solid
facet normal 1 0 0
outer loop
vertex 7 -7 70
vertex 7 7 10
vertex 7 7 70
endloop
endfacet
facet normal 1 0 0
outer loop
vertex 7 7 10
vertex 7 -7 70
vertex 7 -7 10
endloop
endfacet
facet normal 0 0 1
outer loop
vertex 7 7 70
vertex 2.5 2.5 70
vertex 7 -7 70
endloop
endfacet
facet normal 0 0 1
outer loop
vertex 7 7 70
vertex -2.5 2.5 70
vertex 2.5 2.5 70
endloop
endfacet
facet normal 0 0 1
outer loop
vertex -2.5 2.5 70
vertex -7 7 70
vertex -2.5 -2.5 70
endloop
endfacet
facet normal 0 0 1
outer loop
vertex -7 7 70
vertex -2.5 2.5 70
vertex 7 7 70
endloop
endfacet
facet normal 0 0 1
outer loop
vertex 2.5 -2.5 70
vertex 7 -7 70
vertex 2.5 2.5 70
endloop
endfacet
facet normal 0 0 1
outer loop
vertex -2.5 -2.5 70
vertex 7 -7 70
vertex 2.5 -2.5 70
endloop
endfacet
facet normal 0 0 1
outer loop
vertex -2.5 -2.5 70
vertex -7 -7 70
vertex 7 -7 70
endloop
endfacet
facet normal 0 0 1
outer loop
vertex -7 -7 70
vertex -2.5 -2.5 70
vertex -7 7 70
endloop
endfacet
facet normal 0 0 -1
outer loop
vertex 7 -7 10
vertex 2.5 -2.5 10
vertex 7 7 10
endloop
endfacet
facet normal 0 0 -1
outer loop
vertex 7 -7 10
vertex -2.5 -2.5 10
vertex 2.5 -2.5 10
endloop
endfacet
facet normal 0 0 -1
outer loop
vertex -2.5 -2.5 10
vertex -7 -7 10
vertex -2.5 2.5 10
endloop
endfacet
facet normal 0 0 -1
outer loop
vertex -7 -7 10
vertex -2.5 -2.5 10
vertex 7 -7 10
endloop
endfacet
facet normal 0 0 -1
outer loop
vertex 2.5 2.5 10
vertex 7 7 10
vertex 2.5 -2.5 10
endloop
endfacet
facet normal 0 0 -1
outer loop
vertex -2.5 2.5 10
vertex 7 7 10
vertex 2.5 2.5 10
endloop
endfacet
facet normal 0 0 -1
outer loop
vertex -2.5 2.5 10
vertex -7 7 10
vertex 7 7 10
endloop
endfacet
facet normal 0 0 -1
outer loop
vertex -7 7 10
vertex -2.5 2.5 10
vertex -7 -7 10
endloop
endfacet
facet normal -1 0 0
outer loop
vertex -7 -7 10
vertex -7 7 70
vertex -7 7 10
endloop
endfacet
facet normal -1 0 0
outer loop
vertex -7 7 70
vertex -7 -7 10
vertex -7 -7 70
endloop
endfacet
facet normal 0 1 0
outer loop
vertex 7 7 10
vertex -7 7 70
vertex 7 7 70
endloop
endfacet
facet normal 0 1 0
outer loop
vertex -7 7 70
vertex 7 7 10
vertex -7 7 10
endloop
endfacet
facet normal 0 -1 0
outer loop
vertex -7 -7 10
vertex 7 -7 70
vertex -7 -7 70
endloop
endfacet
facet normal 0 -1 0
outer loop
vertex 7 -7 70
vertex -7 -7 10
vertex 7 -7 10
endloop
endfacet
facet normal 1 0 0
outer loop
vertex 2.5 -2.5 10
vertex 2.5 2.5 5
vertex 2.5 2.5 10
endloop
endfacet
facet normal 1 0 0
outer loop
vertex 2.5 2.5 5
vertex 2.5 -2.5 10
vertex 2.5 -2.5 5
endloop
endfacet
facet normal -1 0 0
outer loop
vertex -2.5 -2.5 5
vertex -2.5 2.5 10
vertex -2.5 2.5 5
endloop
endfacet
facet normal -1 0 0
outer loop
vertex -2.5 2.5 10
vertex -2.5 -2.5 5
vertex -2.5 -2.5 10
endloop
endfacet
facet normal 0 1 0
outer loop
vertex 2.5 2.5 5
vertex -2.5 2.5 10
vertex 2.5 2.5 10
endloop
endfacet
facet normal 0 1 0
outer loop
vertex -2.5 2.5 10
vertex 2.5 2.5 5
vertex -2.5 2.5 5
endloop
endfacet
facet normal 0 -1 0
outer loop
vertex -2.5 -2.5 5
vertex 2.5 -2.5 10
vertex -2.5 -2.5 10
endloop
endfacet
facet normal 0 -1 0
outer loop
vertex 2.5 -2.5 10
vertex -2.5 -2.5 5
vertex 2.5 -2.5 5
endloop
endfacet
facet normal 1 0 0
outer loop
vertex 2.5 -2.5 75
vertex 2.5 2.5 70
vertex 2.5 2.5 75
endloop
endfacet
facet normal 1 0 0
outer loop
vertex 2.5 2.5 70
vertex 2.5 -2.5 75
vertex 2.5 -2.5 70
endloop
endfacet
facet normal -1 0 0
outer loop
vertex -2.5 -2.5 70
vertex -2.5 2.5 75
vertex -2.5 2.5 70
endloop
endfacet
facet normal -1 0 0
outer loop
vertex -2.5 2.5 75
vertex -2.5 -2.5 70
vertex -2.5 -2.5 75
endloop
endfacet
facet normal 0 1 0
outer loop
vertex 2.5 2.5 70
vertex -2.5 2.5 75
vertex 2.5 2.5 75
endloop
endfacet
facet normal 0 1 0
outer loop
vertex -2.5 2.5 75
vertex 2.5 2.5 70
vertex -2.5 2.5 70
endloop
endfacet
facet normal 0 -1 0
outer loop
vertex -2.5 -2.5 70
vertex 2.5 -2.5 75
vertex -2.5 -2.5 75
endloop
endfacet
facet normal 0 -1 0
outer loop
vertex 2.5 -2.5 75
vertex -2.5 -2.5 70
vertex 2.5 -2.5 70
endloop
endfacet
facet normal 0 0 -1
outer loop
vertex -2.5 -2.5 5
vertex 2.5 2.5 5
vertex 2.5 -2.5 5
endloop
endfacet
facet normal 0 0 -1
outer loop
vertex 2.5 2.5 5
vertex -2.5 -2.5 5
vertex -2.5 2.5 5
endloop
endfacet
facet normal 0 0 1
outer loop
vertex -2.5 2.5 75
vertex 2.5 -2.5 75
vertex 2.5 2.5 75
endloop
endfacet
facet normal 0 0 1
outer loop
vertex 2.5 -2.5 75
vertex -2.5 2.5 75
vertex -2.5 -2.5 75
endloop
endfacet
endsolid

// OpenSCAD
//90mm hoch //37mm durchmesser //32mm 18mm

accuracy_level = 256;

foot_height = 10;

outer_diameter1 = 45;
outer_diameter2 = 40;

height = 70;

rotation = 40;

holm_diameter = 14;

micro_length = 25;
micro_smalldia = 31;
micro_thickdia = 37;

connector_width = 5;
connector_height = 10;

module footer()
{
    cylinder(h=foot_height,d1=outer_diameter1,d2=outer_diameter2,center=false, $fn=accuracy_level);
}

//Holm quadrat
module holm_neu()
{
    translate([-holm_diameter/2,-holm_diameter/2,foot_height])
    color("red")
    cube([holm_diameter,holm_diameter,height-foot_height]);
}

//Holm 
module holm()
{
    translate([0,0,foot_height])
    color("red")
    cylinder(h=height-foot_height,d1=holm_diameter,d2=holm_diameter,center=false, $fn=accuracy_level);
}

module holderstandconnector()
{
    translate([0,0,height])
    color("blue")
    cylinder(h=12.8,d1=holm_diameter,d2=holm_diameter,center=false, $fn=accuracy_level);
}

module holder()
{
    translate([-20.8,0,height+18])
    rotate([0,rotation,0])
    cylinder(h=18.7,d1=outer_diameter2,d2=outer_diameter1,center=false, $fn=accuracy_level);
}

module holder_top_cutout()
{
    color("pink")
    translate([-25,0,100])
    rotate([0,rotation,0])
    cube([29,29,29], center = true);
}

module holderloch()
{
    translate([-24,-0,height+14])
    rotate([0,rotation,0])
    {
        color("green")
        cylinder(h=micro_length,d1=micro_smalldia,d2=micro_thickdia,center=false, $fn=accuracy_level);
    }
}

module holderhull()
{
    hull()
    {
      holder();
      holderstandconnector();      
    }
}

module top()
{
    difference()
    {
        holderhull();
        holderloch();
        
        holder_top_cutout();
    }
    //holder_top_cutout();
    //holderloch();
}

module connector()
{
    color("gray")
    cube([connector_width,connector_width,connector_height], center = true);
}

module connector_bottom()
{    
    translate([0,0,foot_height])
    connector();
}

module footer_with_connector_hole()
{
    difference()
    {
        footer();
        connector_bottom();
    }
}

module connector_top()
{    
    translate([0,0,height])
    connector();
}

module holm_with_connector_holes()
{
    difference()
    {
        holm_neu();
        connector_bottom();
        connector_top();
    }
}

module top_with_connector_hole()
{
    difference()
    {
        top();
        connector_top();
    }
}

//footer_with_connector_hole();
connector_bottom();
holm_with_connector_holes();
connector_top();
//top_with_connector_hole();
    
